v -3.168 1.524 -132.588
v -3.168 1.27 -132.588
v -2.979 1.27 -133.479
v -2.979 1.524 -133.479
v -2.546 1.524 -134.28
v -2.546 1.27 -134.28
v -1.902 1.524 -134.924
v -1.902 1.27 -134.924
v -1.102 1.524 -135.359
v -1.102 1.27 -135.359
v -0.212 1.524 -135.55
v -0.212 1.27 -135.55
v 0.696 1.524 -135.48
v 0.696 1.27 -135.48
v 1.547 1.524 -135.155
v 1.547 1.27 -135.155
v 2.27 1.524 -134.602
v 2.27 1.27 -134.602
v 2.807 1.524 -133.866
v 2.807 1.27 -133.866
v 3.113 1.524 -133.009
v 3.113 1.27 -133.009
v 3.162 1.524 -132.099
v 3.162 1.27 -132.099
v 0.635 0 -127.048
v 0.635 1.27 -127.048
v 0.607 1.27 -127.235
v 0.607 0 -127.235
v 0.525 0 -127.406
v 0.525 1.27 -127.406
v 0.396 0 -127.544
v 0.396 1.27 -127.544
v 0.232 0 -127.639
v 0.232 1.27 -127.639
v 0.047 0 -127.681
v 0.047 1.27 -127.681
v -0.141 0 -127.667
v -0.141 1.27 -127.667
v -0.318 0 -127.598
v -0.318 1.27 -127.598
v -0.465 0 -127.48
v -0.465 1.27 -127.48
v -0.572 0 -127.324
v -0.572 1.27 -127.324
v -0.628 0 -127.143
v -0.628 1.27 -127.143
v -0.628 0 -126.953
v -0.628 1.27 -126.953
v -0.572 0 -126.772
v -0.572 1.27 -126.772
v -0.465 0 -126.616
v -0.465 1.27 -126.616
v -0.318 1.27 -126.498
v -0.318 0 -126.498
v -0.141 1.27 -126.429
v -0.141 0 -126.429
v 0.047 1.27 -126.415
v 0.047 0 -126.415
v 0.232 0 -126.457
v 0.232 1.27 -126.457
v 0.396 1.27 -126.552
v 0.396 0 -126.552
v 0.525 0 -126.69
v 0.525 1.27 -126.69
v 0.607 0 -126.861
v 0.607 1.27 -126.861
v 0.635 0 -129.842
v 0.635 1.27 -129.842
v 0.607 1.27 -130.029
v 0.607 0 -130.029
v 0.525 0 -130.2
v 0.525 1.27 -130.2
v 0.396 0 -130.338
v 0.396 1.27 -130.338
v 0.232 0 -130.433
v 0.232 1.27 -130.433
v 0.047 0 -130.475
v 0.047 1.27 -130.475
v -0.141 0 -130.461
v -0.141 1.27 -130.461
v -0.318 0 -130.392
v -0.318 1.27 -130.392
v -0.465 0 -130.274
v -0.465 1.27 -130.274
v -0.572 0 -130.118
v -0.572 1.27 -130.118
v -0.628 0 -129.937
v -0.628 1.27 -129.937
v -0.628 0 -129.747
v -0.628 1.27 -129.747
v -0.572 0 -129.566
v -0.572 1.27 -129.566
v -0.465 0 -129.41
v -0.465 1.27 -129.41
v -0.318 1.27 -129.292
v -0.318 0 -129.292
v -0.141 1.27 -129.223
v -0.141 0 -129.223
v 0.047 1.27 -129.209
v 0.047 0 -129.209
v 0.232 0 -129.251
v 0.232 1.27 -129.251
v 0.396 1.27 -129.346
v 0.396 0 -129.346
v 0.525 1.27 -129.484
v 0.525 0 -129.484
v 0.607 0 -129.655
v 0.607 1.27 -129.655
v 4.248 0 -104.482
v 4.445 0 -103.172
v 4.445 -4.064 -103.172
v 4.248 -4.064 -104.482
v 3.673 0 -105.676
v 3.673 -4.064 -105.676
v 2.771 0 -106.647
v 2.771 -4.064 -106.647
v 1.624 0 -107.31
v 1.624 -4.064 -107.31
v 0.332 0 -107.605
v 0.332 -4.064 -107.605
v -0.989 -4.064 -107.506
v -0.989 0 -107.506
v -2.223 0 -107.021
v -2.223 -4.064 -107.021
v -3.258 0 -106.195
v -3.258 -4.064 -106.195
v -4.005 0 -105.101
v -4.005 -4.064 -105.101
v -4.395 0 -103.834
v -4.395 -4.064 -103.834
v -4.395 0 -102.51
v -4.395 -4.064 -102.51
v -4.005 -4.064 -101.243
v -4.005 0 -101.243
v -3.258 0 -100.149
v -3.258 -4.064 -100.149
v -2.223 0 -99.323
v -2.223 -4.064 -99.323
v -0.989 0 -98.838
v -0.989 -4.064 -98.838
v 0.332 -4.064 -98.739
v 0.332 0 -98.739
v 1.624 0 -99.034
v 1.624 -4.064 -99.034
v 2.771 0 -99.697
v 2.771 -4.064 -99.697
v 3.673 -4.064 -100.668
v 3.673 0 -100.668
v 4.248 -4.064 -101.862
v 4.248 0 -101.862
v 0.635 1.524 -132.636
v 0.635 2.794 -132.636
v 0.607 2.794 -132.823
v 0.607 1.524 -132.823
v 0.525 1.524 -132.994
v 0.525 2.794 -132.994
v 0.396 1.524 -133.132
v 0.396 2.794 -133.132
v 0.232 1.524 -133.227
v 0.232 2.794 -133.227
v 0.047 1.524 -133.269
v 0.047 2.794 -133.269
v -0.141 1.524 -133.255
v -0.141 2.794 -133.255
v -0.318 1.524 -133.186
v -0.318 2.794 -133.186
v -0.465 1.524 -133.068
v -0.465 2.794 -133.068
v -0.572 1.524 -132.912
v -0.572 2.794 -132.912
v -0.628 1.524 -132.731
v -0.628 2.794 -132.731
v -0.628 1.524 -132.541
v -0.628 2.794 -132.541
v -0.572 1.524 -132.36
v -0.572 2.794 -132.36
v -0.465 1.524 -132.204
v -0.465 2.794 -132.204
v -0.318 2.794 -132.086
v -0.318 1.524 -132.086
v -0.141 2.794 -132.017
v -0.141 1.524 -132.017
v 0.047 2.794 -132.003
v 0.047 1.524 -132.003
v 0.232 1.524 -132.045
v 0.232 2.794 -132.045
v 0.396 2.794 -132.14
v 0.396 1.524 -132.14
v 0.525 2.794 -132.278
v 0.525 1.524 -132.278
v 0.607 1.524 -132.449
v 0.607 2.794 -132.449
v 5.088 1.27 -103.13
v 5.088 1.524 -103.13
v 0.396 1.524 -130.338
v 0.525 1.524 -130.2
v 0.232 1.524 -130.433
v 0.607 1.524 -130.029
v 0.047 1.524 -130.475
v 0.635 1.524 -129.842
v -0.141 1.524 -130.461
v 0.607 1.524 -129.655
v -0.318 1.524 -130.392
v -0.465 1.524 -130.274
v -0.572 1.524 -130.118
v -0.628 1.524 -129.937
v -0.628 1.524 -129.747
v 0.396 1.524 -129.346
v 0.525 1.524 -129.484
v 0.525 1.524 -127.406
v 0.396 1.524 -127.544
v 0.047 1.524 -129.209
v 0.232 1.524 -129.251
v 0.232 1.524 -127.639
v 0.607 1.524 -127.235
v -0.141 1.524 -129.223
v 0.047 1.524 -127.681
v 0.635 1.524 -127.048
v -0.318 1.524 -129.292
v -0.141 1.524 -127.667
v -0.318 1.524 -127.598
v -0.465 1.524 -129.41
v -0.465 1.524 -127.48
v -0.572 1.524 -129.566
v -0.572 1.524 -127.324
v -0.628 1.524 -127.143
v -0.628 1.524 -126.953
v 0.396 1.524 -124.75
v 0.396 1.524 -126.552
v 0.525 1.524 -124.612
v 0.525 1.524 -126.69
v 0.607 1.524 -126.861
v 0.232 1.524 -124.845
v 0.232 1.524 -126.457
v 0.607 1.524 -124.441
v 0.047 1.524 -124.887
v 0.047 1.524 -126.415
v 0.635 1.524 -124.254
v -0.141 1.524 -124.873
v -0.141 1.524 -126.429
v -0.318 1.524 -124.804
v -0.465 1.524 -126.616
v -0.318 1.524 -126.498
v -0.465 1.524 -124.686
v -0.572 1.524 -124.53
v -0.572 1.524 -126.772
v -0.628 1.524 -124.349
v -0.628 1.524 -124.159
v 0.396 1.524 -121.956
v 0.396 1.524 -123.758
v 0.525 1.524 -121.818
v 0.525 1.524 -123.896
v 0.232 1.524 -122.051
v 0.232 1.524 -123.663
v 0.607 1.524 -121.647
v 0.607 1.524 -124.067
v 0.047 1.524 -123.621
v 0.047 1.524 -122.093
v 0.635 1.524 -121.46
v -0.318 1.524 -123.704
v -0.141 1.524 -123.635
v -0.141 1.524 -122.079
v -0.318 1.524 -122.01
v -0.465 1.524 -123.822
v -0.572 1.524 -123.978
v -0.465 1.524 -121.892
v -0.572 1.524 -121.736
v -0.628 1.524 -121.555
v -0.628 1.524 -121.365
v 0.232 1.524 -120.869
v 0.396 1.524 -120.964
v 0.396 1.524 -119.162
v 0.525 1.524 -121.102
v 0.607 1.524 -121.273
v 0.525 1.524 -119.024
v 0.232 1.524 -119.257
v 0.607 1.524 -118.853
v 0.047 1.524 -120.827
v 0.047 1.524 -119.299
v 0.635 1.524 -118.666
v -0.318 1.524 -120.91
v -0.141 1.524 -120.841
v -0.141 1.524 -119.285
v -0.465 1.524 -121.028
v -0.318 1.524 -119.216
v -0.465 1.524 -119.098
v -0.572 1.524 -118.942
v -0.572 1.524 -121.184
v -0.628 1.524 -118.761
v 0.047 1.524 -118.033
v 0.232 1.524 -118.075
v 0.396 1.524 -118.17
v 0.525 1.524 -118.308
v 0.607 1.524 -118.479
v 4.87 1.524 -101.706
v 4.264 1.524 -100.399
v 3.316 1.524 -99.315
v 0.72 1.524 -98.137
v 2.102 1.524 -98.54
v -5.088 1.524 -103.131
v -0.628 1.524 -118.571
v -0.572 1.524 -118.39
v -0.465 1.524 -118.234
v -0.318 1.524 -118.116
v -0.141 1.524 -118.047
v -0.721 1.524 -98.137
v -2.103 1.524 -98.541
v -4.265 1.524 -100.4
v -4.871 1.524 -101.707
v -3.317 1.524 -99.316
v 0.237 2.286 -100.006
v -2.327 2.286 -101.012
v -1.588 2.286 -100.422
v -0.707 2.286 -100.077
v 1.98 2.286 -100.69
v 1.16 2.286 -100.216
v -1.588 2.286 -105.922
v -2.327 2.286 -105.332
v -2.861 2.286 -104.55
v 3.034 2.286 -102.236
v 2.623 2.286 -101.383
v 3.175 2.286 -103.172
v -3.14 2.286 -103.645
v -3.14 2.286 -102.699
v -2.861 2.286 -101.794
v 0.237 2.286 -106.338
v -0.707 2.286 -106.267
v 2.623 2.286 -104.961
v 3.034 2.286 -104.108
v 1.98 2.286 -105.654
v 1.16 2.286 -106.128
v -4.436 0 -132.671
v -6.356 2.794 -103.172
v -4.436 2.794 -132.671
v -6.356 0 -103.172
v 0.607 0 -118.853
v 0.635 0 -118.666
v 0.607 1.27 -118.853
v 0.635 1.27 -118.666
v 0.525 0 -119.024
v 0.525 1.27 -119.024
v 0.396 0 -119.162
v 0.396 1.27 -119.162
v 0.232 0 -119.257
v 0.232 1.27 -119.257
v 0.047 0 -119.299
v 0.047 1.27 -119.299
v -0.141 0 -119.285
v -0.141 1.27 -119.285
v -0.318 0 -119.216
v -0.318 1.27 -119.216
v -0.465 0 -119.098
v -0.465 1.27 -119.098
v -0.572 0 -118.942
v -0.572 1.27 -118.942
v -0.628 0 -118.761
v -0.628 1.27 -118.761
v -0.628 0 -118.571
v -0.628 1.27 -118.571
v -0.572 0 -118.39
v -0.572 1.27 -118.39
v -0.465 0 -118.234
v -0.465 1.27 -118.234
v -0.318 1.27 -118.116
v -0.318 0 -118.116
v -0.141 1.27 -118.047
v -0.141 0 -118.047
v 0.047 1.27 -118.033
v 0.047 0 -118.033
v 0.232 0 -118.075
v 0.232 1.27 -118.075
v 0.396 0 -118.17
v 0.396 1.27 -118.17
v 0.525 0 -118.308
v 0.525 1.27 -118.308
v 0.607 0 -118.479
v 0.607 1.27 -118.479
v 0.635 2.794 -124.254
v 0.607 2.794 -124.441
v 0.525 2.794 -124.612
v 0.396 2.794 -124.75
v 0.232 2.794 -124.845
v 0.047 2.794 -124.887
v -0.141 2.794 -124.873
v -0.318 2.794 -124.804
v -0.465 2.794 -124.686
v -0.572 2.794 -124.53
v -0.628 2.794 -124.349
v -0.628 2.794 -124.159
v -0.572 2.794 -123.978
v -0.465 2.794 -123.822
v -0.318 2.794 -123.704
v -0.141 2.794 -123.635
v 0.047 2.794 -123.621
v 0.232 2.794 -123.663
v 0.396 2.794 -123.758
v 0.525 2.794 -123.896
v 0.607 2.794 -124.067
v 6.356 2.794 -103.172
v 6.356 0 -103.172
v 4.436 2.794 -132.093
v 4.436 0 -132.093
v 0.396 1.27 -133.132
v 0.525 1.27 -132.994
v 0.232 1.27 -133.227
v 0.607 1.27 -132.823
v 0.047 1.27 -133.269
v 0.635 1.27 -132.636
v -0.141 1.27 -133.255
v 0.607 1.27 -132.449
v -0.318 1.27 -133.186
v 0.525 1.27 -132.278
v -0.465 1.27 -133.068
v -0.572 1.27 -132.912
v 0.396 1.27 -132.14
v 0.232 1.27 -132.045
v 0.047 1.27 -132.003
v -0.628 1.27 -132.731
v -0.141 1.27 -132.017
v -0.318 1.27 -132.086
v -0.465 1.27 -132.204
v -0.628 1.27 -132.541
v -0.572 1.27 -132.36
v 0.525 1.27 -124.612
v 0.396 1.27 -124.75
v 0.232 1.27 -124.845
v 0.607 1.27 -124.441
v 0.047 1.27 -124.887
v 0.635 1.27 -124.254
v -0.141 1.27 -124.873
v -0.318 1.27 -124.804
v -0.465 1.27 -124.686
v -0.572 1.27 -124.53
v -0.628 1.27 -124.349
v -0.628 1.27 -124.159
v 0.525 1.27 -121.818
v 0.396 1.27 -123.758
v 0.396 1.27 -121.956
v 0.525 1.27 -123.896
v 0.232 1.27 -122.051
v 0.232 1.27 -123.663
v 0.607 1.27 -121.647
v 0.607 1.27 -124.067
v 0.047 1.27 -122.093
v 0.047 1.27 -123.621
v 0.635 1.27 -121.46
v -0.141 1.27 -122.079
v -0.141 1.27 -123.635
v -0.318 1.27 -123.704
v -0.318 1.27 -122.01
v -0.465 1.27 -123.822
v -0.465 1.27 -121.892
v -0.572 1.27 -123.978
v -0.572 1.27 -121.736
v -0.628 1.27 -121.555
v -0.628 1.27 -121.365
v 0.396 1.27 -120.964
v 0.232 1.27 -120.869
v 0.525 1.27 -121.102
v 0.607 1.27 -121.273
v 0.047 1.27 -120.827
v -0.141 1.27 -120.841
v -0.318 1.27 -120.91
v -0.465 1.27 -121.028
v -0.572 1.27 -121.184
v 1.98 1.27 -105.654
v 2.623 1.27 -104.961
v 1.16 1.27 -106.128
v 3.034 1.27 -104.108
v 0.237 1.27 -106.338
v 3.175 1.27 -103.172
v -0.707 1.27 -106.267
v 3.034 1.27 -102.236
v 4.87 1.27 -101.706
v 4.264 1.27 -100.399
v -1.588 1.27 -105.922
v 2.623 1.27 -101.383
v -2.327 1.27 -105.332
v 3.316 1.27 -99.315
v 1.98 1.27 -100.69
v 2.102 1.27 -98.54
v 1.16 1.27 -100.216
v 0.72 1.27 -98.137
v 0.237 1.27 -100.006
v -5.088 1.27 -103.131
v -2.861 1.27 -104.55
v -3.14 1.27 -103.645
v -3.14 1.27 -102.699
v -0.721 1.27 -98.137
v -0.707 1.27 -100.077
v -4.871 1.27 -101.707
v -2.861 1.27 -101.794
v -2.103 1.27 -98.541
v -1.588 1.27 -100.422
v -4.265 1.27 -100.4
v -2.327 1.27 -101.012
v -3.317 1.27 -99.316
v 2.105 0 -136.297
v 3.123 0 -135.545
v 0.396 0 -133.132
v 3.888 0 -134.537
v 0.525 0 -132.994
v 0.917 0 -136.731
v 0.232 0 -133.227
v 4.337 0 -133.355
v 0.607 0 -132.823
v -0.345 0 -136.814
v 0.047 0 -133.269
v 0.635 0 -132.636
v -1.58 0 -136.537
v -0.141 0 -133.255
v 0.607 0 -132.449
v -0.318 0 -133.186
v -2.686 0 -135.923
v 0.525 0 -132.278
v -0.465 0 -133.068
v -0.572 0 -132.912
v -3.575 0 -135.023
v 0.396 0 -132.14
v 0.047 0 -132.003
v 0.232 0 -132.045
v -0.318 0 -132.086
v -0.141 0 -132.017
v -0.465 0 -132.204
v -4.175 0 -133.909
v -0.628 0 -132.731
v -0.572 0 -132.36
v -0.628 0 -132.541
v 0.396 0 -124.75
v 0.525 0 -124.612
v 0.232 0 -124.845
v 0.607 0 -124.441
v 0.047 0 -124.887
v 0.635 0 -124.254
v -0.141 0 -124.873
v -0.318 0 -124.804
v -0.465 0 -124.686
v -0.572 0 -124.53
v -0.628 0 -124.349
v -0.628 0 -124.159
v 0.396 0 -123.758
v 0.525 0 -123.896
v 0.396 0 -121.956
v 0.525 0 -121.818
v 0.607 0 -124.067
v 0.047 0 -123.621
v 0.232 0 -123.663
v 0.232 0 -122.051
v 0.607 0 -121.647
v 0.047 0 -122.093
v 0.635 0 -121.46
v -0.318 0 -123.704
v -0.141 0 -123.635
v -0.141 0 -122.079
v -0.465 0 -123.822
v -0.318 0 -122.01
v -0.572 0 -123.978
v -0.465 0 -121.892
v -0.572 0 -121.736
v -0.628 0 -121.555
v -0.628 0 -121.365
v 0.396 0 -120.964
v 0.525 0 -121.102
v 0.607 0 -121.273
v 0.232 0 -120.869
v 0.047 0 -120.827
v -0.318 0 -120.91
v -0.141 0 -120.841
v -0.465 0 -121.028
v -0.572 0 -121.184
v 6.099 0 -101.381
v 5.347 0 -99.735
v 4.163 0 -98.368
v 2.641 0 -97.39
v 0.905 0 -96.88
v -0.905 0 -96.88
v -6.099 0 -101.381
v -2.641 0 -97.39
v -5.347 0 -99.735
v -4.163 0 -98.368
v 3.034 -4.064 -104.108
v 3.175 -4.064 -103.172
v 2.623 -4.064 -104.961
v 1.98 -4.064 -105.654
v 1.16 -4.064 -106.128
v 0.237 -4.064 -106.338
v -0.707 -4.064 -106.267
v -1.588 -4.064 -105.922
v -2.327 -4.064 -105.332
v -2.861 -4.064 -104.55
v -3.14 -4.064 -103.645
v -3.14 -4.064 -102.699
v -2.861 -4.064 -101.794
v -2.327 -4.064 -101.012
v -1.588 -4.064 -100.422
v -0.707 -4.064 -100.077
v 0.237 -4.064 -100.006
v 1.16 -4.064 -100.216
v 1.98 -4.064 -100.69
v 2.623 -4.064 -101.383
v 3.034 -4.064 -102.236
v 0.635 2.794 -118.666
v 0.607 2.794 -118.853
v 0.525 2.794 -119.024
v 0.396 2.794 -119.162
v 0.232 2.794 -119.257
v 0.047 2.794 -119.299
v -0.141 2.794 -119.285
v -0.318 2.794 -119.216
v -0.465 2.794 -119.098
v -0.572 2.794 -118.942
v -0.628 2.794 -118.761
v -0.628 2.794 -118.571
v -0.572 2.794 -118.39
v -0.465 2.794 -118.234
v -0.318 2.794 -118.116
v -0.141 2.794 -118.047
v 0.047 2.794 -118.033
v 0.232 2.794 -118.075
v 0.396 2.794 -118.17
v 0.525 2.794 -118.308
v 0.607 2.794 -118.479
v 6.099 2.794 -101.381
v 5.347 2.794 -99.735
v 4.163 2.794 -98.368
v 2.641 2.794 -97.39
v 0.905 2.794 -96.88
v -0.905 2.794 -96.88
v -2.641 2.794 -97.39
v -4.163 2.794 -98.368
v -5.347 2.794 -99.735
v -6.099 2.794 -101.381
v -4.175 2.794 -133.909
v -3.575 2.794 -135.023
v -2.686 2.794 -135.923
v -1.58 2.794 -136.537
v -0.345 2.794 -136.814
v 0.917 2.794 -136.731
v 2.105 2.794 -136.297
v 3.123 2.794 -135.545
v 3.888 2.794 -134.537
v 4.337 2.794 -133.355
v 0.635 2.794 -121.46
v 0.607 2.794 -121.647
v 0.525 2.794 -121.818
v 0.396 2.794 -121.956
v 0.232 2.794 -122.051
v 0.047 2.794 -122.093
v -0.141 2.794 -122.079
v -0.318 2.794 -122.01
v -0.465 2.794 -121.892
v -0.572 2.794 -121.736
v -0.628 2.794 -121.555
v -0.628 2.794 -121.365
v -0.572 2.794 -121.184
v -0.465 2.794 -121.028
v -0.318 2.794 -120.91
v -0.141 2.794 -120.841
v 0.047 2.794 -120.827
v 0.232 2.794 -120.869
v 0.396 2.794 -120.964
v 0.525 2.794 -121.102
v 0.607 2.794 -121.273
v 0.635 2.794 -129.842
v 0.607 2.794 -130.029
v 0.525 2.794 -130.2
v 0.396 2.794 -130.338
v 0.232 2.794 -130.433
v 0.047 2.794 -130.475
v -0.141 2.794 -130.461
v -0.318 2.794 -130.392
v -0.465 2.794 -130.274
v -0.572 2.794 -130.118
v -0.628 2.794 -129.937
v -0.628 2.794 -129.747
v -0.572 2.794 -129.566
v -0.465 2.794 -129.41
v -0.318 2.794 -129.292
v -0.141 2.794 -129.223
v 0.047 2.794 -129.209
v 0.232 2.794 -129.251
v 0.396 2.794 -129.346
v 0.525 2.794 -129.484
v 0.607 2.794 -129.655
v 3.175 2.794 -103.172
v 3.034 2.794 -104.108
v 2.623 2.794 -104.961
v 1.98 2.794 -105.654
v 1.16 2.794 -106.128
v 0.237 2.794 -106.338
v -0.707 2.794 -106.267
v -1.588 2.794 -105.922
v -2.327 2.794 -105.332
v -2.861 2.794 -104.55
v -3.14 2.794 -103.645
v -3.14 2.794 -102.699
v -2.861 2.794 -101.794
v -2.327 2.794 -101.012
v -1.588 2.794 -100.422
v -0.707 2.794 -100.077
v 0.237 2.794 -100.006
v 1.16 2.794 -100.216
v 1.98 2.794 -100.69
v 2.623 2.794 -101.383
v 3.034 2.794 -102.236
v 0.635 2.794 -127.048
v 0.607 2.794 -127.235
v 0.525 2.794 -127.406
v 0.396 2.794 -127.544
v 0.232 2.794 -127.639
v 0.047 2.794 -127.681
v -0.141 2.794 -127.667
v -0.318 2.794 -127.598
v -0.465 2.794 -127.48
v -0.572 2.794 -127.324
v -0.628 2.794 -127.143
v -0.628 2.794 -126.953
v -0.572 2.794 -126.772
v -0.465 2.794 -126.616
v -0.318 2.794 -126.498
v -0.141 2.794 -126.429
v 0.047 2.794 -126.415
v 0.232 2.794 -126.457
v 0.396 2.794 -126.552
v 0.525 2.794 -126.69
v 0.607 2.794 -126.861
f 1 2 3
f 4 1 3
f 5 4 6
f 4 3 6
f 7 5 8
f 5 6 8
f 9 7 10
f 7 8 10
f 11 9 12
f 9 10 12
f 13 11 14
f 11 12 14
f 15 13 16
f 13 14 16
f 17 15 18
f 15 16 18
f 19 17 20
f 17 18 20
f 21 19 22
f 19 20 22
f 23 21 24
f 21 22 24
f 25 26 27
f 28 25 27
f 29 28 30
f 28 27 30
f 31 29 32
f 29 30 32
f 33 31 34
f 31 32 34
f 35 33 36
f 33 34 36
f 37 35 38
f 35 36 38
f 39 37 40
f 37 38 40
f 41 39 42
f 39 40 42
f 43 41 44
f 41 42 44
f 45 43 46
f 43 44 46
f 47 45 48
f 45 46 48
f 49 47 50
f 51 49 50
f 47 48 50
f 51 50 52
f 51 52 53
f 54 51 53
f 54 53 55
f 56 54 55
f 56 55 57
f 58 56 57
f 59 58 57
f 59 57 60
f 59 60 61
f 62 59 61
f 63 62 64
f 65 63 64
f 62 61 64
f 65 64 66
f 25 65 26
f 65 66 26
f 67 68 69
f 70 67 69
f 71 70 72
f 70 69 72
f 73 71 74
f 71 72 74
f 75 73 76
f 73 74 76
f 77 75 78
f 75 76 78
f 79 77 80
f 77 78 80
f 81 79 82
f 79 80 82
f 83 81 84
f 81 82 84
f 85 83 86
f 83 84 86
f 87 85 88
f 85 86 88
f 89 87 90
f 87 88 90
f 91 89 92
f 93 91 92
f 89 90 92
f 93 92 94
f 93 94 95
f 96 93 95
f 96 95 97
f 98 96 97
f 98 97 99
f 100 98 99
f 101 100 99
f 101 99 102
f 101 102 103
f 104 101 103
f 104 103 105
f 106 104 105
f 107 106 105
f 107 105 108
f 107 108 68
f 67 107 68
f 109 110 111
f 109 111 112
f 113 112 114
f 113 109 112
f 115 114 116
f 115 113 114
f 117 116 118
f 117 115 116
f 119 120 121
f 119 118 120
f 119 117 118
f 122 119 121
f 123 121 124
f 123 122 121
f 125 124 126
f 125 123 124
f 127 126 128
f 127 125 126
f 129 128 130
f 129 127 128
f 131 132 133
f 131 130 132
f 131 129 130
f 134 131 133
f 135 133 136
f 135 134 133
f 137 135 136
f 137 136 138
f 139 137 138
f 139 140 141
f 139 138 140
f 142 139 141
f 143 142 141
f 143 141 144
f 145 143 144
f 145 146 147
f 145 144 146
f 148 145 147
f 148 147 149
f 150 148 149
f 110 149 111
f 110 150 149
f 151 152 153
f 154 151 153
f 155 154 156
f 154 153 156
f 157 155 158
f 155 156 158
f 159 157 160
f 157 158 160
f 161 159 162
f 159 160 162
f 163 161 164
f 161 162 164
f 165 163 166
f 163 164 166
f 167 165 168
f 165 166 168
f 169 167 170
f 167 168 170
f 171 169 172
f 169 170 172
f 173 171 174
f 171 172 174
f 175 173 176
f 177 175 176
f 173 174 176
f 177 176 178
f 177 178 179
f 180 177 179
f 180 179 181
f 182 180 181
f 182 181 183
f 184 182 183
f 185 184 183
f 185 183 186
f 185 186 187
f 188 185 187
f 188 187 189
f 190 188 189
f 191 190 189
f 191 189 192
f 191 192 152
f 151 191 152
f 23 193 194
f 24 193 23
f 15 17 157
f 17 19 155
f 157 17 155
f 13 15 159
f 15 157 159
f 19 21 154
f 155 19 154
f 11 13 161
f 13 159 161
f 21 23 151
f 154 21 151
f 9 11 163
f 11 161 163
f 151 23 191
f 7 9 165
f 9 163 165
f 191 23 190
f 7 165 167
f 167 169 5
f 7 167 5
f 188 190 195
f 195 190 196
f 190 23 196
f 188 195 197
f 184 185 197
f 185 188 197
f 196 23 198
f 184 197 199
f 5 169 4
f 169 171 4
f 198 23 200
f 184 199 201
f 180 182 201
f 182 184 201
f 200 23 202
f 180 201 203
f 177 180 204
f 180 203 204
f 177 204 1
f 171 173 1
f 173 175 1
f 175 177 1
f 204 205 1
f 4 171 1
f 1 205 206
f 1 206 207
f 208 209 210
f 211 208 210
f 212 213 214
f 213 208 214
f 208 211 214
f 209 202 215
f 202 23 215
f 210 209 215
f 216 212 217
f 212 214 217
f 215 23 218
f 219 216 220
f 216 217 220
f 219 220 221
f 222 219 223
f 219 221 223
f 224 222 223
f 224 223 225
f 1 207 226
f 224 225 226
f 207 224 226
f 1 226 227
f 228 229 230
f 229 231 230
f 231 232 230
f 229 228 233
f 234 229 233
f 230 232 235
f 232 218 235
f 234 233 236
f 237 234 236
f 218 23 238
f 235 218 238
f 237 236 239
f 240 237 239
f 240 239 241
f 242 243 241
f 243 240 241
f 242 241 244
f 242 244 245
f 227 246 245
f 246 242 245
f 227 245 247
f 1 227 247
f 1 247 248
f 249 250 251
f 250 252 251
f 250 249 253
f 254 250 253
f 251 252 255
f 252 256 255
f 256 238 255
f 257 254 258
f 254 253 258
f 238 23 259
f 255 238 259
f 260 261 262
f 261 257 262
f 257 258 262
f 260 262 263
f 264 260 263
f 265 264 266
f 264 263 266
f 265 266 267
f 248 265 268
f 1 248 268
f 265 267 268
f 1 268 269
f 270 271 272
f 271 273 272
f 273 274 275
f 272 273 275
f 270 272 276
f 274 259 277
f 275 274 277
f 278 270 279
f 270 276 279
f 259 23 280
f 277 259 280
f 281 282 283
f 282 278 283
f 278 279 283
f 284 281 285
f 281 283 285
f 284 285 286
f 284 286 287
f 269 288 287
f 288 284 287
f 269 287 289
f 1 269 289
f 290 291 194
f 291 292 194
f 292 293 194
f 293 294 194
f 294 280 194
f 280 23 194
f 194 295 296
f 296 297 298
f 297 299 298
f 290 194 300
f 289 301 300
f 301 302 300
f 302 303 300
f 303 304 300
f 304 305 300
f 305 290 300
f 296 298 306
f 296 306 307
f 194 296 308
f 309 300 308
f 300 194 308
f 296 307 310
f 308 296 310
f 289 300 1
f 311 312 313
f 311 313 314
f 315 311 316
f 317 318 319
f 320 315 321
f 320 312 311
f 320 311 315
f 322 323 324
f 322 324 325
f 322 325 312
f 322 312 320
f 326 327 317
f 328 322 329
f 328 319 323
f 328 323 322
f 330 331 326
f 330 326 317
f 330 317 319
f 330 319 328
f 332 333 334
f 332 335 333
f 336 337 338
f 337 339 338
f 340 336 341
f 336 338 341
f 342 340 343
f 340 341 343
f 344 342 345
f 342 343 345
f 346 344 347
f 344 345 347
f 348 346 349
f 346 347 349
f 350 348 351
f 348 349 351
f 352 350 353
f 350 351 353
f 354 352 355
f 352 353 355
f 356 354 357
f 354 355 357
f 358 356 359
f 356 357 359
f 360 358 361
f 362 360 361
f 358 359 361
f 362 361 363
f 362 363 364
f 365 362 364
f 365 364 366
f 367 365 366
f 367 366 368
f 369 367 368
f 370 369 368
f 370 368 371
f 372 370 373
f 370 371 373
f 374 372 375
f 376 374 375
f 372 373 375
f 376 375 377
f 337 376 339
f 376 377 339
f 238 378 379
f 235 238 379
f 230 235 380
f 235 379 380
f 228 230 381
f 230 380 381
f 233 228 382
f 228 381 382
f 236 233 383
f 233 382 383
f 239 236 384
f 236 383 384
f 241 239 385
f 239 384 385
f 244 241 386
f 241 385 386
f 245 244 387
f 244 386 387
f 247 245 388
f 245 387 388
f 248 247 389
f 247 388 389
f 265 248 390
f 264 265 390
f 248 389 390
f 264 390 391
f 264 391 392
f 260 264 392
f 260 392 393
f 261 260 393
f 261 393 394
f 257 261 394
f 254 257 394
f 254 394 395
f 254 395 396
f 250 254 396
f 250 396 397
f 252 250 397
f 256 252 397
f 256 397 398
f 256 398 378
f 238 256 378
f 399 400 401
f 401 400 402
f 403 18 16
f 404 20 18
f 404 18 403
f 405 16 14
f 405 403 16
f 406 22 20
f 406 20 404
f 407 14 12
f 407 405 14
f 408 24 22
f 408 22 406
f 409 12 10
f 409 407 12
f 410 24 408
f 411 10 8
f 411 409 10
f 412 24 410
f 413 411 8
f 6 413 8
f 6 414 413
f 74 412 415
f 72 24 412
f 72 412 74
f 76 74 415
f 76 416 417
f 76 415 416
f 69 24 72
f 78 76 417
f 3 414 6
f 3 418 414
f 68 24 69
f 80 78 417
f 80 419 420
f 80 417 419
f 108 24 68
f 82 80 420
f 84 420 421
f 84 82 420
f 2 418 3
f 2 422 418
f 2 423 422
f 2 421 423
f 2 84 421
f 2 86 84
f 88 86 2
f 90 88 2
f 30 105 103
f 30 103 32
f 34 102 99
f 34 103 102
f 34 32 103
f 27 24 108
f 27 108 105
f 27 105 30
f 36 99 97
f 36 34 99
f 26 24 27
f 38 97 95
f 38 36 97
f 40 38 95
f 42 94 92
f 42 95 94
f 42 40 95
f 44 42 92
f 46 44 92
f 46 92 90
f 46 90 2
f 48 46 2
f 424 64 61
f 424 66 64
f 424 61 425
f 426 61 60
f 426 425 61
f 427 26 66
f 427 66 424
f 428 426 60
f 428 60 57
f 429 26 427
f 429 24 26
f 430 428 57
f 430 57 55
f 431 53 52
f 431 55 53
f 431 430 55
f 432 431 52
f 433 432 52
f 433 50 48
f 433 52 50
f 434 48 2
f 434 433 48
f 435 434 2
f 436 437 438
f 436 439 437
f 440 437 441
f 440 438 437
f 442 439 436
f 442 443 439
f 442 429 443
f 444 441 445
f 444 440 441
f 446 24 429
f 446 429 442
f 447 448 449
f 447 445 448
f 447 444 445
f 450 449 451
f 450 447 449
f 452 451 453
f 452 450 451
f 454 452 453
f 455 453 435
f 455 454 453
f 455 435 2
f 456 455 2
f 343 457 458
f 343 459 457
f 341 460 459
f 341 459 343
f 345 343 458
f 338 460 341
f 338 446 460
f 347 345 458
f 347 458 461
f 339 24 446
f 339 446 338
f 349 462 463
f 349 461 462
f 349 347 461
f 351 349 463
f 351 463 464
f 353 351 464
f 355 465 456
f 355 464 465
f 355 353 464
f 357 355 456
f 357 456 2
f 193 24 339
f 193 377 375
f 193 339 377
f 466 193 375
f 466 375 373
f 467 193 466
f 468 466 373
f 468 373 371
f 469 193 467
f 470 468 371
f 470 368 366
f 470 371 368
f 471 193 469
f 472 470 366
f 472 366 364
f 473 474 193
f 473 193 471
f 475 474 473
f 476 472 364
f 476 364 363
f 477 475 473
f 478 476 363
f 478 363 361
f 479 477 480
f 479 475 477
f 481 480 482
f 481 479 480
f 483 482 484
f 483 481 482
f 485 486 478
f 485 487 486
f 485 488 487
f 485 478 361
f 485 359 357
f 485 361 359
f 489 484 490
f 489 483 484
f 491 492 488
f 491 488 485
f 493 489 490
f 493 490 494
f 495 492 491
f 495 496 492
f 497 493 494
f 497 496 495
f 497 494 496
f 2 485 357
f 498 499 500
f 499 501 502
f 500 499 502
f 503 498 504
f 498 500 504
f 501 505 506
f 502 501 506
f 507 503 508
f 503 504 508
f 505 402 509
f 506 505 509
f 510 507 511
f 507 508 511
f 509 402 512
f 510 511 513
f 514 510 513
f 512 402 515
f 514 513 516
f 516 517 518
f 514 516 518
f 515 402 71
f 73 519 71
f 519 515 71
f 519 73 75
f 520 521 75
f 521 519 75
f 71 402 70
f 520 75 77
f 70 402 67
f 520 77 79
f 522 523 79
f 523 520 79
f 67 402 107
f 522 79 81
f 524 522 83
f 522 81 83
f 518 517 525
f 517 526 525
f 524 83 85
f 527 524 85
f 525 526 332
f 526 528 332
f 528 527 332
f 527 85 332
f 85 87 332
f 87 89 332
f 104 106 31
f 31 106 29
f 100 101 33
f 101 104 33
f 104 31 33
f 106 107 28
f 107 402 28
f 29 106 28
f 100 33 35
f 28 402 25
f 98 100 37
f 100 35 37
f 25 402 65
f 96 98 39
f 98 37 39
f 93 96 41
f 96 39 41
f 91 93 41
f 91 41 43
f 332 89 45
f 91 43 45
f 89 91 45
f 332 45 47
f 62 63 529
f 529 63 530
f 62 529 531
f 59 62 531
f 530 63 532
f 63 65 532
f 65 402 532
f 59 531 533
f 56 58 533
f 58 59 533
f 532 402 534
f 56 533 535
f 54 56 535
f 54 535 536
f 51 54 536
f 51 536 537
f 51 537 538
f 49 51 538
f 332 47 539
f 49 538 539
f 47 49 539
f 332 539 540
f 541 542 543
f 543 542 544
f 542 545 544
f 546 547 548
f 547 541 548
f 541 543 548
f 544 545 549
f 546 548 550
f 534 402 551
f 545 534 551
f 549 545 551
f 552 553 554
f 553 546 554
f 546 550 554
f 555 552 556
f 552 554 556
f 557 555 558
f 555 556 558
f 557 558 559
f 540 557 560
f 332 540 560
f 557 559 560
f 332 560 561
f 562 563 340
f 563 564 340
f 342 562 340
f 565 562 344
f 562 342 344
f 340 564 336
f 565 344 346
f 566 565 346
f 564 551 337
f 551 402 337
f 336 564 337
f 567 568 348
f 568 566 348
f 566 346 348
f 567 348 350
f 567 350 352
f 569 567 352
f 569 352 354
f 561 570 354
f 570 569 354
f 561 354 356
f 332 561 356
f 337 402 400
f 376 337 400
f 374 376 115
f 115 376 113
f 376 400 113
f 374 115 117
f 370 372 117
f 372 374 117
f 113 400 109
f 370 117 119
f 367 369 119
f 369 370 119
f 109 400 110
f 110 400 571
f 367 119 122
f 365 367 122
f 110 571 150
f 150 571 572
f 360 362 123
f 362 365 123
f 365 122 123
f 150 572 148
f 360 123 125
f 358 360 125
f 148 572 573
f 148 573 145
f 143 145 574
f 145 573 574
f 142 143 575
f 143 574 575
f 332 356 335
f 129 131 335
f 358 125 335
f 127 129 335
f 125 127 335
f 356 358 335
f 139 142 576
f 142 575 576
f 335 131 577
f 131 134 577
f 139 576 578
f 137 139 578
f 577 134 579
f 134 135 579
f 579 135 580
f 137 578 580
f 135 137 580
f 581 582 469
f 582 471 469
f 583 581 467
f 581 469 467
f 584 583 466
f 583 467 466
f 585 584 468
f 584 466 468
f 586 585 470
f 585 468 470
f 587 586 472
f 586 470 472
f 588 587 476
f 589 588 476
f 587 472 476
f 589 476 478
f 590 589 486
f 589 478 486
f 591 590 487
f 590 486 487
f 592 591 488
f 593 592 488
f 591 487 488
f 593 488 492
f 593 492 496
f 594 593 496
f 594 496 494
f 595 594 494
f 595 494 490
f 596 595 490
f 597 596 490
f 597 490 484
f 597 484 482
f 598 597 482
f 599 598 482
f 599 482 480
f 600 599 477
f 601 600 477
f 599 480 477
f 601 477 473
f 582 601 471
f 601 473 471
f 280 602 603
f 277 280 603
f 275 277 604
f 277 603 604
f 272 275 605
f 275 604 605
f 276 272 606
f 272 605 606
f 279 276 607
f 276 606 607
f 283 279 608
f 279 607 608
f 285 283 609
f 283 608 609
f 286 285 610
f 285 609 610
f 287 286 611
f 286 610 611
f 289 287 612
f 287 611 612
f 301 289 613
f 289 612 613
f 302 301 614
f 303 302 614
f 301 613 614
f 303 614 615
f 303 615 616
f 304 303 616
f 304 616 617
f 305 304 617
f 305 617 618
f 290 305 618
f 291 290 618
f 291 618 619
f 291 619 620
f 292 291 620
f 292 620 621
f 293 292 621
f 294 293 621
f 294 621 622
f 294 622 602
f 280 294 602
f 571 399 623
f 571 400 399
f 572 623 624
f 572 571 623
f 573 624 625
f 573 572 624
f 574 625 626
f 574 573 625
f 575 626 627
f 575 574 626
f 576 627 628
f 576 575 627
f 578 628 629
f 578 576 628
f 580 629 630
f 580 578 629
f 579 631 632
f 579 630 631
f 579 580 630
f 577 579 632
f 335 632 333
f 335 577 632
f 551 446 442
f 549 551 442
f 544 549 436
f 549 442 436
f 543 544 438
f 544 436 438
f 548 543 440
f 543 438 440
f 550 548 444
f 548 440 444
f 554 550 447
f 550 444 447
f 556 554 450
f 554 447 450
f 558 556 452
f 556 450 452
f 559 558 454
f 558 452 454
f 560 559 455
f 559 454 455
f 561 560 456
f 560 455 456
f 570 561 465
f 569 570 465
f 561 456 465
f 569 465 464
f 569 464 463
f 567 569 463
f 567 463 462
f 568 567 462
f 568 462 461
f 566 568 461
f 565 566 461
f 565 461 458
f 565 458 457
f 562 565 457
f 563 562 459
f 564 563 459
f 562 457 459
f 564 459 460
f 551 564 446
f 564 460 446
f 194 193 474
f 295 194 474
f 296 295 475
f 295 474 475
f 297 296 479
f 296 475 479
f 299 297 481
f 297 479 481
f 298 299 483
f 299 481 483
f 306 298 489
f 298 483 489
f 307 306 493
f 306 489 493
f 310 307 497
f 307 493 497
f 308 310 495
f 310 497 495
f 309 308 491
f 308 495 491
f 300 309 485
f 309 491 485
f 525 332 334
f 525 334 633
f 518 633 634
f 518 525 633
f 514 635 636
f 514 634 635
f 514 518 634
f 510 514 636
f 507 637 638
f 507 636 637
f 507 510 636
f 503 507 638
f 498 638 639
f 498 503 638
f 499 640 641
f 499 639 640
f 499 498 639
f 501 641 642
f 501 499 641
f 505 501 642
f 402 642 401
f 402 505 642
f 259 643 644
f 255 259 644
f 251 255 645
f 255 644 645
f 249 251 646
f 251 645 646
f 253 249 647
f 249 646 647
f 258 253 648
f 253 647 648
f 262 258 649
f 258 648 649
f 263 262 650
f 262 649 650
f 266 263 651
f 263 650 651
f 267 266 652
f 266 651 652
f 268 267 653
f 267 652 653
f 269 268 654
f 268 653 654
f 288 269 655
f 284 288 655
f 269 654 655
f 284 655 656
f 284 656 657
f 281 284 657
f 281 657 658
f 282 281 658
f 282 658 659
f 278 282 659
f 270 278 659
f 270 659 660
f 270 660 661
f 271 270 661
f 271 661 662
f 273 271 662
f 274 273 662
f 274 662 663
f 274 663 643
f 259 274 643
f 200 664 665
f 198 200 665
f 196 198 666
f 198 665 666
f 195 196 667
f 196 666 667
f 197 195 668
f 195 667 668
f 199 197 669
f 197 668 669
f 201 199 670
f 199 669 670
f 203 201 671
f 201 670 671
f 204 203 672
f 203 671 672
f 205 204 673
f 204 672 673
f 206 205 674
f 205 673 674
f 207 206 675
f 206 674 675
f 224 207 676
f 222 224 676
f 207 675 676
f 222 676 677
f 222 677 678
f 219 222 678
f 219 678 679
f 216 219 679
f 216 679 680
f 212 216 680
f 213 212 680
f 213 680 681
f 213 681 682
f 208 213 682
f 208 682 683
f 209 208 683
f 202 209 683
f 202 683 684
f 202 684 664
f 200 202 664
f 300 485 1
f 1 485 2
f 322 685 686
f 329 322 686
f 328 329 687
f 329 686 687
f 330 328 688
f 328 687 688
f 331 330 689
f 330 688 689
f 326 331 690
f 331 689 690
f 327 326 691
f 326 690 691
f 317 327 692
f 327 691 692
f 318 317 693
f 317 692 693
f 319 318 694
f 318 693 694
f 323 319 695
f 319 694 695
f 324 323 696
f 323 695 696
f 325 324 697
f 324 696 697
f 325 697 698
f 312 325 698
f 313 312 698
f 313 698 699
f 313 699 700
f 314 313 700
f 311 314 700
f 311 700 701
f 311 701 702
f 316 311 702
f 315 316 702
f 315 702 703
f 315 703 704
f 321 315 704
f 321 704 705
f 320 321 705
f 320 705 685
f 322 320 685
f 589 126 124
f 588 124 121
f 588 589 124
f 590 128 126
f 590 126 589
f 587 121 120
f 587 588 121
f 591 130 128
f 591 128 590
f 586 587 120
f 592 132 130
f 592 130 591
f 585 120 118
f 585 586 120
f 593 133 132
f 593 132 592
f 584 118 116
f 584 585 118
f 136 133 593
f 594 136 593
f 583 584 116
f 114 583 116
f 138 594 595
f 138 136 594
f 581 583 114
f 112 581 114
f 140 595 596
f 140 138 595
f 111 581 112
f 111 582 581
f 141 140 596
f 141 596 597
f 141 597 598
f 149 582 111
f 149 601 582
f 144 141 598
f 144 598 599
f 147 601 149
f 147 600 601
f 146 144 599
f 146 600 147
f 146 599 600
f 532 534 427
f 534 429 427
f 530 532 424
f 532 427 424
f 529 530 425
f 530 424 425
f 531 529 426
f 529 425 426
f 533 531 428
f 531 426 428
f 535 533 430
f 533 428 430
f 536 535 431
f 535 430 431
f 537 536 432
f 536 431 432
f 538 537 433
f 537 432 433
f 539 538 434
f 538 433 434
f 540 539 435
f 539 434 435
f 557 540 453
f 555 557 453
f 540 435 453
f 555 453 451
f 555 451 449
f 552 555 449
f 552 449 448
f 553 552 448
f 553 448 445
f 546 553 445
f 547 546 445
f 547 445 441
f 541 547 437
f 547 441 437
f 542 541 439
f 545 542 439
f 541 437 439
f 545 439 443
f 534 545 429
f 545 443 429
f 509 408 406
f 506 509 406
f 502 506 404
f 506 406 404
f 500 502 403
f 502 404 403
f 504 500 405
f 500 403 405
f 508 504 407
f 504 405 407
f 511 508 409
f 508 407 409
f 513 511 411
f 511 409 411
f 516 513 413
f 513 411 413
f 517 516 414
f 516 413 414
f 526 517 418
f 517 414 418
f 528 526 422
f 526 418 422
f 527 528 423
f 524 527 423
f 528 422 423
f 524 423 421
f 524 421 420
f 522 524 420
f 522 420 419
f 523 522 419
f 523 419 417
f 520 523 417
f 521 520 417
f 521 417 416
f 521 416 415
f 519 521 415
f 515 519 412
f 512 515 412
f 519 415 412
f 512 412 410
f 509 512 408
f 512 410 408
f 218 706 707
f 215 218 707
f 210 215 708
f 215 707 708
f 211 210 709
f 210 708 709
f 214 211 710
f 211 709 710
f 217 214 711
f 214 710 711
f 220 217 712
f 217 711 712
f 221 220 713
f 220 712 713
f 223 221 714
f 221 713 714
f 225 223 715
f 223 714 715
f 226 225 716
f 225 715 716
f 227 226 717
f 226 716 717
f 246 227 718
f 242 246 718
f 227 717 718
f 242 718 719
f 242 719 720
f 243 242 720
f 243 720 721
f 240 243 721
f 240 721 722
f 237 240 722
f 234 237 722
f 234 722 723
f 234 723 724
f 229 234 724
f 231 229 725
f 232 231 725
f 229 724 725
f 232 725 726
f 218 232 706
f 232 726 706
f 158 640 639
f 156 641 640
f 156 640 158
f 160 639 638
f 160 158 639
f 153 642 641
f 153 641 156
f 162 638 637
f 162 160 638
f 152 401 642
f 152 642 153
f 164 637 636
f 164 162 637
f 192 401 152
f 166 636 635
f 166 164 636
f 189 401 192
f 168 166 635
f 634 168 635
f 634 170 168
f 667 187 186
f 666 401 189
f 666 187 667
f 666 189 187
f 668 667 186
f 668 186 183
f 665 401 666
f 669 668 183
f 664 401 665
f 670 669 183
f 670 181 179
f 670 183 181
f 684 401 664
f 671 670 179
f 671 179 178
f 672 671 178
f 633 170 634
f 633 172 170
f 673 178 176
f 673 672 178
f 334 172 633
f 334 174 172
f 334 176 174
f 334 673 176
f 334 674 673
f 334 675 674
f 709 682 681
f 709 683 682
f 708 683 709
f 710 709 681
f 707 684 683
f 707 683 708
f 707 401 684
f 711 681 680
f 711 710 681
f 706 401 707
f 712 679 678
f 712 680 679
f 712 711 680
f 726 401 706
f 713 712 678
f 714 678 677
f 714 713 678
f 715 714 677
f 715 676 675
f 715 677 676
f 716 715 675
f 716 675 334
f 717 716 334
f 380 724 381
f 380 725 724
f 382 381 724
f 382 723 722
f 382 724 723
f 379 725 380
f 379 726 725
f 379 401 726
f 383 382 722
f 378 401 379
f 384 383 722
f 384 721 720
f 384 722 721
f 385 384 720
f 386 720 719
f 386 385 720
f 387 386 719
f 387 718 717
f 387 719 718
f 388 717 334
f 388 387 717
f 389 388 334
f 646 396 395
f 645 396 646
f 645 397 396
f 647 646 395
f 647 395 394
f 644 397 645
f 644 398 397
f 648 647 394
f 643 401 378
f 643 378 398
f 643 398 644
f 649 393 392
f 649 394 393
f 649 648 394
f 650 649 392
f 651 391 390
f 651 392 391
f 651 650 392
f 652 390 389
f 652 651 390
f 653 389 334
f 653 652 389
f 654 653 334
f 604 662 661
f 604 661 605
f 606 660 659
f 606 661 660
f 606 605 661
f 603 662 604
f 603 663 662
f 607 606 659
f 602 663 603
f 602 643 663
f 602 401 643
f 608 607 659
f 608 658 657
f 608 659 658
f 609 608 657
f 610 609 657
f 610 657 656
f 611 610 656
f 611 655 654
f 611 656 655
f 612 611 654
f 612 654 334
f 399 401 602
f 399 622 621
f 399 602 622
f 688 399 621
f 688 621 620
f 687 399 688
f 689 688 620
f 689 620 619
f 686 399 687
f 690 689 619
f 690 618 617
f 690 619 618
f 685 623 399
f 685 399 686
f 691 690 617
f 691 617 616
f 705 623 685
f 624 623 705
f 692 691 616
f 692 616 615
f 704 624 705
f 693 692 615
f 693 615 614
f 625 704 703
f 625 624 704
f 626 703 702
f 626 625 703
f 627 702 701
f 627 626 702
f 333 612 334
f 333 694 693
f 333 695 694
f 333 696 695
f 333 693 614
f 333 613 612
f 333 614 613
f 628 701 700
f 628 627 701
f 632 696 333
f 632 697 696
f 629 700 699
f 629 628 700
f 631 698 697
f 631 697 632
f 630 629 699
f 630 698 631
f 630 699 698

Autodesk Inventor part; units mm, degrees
ref_plane "YZ Plane" through (0, 0, 0) normal (1, 0, 0) x (0, 1, 0)
ref_plane "XZ Plane" through (0, 0, 0) normal (0, 1, 0) x (-1, 0, 0)
ref_plane "XY Plane" through (0, 0, 0) normal (0, 0, 1) x (1, 0, 0)
sketch "Sketch1" plane through (0, 0, 0) normal (0, 1, 0) x (-1, 0, 0)
  arc A0 (6.3027, -103.9963) -> (-6.3005, -104.0126) centre (0, -103.172) ccw
  arc A1 (-4.4356, -132.0932) -> (4.4356, -132.6708) centre (0, -132.382) ccw
  line L0 (6.3563, -103.172) -> (4.4356, -132.6708)
  line L1 (-6.3563, -103.172) -> (-4.4356, -132.0932)
  point P0 (0, 0)
  dimension "d0" = 12.7127
  dimension "d1" = 8.89
  dimension "d2" = 29.21
extrude "Extrusion1" add sketch "Sketch1" along normal blind 2.794 contours L0 A1 L1 A0
sketch "Sketch2" plane through (0, 0, 0) normal (0, -1, 0) x (1, 0, 0)
  circle A0 centre (0, -103.172) radius 4.445
  arc A1 (6.3563, -103.172) -> (-6.3563, -103.172) centre (0, -103.172) ccw projected
  point P0 (0, 0)
  dimension "d5" = 8.89
  dimension "d6" = 0
extrude "Extrusion2" add sketch "Sketch2" along normal blind 4.064
shell "Shell1" thickness 1.27 removed faces 1 at (-0.8417, -4.064, -105.7685)
sketch "Sketch3" plane through (0, 2.794, 0) normal (0, 1, 0) x (1, 0, 0)
  circle A0 centre (0, 132.636) radius 0.635
  circle A1 centre (0, 129.842) radius 0.635
  circle A2 centre (0, 127.048) radius 0.635
  circle A3 centre (0, 124.254) radius 0.635
  circle A4 centre (0, 121.46) radius 0.635
  circle A5 centre (0, 118.666) radius 0.635
  arc A6 (4.4356, 132.0932) -> (-4.4356, 132.6708) centre (0, 132.382) ccw projected
  arc A7 (-6.3563, 103.172) -> (6.3563, 103.172) centre (0, 103.172) ccw projected
  point P0 (0, 0)
  dimension "d10" = 1.27
  dimension "d11" = 1.27
  dimension "d12" = 1.27
  dimension "d13" = 1.27
  dimension "d14" = 1.27
  dimension "d15" = 1.27
  dimension "d16" = 2.794
  dimension "d17" = 2.794
  dimension "d18" = 2.794
  dimension "d19" = 2.794
  dimension "d20" = 2.794
  dimension "d22" = 15.494
extrude "Extrusion3" cut sketch "Sketch3" against normal blind 4.064
sketch "Sketch4" plane through (0, 2.794, 0) normal (0, 1, 0) x (1, 0, 0)
  circle A0 centre (0, 103.172) radius 3.175 projected
  circle A1 centre (0, 103.172) radius 3.175
  point P0 (0, 0)
extrude "Extrusion4" cut sketch "Sketch4" against normal blind 0.508
equation "\"d11\" = d10"
equation "\"d12\" = d11"
equation "\"d13\" = d12"
equation "\"d14\" = d10"
equation "\"d15\" = d10"
equation "\"d17\" = d16"
equation "\"d18\" = d17"
equation "\"d19\" = d18"
equation "\"d20\" = d19"
properties part number "Servo Horn"
